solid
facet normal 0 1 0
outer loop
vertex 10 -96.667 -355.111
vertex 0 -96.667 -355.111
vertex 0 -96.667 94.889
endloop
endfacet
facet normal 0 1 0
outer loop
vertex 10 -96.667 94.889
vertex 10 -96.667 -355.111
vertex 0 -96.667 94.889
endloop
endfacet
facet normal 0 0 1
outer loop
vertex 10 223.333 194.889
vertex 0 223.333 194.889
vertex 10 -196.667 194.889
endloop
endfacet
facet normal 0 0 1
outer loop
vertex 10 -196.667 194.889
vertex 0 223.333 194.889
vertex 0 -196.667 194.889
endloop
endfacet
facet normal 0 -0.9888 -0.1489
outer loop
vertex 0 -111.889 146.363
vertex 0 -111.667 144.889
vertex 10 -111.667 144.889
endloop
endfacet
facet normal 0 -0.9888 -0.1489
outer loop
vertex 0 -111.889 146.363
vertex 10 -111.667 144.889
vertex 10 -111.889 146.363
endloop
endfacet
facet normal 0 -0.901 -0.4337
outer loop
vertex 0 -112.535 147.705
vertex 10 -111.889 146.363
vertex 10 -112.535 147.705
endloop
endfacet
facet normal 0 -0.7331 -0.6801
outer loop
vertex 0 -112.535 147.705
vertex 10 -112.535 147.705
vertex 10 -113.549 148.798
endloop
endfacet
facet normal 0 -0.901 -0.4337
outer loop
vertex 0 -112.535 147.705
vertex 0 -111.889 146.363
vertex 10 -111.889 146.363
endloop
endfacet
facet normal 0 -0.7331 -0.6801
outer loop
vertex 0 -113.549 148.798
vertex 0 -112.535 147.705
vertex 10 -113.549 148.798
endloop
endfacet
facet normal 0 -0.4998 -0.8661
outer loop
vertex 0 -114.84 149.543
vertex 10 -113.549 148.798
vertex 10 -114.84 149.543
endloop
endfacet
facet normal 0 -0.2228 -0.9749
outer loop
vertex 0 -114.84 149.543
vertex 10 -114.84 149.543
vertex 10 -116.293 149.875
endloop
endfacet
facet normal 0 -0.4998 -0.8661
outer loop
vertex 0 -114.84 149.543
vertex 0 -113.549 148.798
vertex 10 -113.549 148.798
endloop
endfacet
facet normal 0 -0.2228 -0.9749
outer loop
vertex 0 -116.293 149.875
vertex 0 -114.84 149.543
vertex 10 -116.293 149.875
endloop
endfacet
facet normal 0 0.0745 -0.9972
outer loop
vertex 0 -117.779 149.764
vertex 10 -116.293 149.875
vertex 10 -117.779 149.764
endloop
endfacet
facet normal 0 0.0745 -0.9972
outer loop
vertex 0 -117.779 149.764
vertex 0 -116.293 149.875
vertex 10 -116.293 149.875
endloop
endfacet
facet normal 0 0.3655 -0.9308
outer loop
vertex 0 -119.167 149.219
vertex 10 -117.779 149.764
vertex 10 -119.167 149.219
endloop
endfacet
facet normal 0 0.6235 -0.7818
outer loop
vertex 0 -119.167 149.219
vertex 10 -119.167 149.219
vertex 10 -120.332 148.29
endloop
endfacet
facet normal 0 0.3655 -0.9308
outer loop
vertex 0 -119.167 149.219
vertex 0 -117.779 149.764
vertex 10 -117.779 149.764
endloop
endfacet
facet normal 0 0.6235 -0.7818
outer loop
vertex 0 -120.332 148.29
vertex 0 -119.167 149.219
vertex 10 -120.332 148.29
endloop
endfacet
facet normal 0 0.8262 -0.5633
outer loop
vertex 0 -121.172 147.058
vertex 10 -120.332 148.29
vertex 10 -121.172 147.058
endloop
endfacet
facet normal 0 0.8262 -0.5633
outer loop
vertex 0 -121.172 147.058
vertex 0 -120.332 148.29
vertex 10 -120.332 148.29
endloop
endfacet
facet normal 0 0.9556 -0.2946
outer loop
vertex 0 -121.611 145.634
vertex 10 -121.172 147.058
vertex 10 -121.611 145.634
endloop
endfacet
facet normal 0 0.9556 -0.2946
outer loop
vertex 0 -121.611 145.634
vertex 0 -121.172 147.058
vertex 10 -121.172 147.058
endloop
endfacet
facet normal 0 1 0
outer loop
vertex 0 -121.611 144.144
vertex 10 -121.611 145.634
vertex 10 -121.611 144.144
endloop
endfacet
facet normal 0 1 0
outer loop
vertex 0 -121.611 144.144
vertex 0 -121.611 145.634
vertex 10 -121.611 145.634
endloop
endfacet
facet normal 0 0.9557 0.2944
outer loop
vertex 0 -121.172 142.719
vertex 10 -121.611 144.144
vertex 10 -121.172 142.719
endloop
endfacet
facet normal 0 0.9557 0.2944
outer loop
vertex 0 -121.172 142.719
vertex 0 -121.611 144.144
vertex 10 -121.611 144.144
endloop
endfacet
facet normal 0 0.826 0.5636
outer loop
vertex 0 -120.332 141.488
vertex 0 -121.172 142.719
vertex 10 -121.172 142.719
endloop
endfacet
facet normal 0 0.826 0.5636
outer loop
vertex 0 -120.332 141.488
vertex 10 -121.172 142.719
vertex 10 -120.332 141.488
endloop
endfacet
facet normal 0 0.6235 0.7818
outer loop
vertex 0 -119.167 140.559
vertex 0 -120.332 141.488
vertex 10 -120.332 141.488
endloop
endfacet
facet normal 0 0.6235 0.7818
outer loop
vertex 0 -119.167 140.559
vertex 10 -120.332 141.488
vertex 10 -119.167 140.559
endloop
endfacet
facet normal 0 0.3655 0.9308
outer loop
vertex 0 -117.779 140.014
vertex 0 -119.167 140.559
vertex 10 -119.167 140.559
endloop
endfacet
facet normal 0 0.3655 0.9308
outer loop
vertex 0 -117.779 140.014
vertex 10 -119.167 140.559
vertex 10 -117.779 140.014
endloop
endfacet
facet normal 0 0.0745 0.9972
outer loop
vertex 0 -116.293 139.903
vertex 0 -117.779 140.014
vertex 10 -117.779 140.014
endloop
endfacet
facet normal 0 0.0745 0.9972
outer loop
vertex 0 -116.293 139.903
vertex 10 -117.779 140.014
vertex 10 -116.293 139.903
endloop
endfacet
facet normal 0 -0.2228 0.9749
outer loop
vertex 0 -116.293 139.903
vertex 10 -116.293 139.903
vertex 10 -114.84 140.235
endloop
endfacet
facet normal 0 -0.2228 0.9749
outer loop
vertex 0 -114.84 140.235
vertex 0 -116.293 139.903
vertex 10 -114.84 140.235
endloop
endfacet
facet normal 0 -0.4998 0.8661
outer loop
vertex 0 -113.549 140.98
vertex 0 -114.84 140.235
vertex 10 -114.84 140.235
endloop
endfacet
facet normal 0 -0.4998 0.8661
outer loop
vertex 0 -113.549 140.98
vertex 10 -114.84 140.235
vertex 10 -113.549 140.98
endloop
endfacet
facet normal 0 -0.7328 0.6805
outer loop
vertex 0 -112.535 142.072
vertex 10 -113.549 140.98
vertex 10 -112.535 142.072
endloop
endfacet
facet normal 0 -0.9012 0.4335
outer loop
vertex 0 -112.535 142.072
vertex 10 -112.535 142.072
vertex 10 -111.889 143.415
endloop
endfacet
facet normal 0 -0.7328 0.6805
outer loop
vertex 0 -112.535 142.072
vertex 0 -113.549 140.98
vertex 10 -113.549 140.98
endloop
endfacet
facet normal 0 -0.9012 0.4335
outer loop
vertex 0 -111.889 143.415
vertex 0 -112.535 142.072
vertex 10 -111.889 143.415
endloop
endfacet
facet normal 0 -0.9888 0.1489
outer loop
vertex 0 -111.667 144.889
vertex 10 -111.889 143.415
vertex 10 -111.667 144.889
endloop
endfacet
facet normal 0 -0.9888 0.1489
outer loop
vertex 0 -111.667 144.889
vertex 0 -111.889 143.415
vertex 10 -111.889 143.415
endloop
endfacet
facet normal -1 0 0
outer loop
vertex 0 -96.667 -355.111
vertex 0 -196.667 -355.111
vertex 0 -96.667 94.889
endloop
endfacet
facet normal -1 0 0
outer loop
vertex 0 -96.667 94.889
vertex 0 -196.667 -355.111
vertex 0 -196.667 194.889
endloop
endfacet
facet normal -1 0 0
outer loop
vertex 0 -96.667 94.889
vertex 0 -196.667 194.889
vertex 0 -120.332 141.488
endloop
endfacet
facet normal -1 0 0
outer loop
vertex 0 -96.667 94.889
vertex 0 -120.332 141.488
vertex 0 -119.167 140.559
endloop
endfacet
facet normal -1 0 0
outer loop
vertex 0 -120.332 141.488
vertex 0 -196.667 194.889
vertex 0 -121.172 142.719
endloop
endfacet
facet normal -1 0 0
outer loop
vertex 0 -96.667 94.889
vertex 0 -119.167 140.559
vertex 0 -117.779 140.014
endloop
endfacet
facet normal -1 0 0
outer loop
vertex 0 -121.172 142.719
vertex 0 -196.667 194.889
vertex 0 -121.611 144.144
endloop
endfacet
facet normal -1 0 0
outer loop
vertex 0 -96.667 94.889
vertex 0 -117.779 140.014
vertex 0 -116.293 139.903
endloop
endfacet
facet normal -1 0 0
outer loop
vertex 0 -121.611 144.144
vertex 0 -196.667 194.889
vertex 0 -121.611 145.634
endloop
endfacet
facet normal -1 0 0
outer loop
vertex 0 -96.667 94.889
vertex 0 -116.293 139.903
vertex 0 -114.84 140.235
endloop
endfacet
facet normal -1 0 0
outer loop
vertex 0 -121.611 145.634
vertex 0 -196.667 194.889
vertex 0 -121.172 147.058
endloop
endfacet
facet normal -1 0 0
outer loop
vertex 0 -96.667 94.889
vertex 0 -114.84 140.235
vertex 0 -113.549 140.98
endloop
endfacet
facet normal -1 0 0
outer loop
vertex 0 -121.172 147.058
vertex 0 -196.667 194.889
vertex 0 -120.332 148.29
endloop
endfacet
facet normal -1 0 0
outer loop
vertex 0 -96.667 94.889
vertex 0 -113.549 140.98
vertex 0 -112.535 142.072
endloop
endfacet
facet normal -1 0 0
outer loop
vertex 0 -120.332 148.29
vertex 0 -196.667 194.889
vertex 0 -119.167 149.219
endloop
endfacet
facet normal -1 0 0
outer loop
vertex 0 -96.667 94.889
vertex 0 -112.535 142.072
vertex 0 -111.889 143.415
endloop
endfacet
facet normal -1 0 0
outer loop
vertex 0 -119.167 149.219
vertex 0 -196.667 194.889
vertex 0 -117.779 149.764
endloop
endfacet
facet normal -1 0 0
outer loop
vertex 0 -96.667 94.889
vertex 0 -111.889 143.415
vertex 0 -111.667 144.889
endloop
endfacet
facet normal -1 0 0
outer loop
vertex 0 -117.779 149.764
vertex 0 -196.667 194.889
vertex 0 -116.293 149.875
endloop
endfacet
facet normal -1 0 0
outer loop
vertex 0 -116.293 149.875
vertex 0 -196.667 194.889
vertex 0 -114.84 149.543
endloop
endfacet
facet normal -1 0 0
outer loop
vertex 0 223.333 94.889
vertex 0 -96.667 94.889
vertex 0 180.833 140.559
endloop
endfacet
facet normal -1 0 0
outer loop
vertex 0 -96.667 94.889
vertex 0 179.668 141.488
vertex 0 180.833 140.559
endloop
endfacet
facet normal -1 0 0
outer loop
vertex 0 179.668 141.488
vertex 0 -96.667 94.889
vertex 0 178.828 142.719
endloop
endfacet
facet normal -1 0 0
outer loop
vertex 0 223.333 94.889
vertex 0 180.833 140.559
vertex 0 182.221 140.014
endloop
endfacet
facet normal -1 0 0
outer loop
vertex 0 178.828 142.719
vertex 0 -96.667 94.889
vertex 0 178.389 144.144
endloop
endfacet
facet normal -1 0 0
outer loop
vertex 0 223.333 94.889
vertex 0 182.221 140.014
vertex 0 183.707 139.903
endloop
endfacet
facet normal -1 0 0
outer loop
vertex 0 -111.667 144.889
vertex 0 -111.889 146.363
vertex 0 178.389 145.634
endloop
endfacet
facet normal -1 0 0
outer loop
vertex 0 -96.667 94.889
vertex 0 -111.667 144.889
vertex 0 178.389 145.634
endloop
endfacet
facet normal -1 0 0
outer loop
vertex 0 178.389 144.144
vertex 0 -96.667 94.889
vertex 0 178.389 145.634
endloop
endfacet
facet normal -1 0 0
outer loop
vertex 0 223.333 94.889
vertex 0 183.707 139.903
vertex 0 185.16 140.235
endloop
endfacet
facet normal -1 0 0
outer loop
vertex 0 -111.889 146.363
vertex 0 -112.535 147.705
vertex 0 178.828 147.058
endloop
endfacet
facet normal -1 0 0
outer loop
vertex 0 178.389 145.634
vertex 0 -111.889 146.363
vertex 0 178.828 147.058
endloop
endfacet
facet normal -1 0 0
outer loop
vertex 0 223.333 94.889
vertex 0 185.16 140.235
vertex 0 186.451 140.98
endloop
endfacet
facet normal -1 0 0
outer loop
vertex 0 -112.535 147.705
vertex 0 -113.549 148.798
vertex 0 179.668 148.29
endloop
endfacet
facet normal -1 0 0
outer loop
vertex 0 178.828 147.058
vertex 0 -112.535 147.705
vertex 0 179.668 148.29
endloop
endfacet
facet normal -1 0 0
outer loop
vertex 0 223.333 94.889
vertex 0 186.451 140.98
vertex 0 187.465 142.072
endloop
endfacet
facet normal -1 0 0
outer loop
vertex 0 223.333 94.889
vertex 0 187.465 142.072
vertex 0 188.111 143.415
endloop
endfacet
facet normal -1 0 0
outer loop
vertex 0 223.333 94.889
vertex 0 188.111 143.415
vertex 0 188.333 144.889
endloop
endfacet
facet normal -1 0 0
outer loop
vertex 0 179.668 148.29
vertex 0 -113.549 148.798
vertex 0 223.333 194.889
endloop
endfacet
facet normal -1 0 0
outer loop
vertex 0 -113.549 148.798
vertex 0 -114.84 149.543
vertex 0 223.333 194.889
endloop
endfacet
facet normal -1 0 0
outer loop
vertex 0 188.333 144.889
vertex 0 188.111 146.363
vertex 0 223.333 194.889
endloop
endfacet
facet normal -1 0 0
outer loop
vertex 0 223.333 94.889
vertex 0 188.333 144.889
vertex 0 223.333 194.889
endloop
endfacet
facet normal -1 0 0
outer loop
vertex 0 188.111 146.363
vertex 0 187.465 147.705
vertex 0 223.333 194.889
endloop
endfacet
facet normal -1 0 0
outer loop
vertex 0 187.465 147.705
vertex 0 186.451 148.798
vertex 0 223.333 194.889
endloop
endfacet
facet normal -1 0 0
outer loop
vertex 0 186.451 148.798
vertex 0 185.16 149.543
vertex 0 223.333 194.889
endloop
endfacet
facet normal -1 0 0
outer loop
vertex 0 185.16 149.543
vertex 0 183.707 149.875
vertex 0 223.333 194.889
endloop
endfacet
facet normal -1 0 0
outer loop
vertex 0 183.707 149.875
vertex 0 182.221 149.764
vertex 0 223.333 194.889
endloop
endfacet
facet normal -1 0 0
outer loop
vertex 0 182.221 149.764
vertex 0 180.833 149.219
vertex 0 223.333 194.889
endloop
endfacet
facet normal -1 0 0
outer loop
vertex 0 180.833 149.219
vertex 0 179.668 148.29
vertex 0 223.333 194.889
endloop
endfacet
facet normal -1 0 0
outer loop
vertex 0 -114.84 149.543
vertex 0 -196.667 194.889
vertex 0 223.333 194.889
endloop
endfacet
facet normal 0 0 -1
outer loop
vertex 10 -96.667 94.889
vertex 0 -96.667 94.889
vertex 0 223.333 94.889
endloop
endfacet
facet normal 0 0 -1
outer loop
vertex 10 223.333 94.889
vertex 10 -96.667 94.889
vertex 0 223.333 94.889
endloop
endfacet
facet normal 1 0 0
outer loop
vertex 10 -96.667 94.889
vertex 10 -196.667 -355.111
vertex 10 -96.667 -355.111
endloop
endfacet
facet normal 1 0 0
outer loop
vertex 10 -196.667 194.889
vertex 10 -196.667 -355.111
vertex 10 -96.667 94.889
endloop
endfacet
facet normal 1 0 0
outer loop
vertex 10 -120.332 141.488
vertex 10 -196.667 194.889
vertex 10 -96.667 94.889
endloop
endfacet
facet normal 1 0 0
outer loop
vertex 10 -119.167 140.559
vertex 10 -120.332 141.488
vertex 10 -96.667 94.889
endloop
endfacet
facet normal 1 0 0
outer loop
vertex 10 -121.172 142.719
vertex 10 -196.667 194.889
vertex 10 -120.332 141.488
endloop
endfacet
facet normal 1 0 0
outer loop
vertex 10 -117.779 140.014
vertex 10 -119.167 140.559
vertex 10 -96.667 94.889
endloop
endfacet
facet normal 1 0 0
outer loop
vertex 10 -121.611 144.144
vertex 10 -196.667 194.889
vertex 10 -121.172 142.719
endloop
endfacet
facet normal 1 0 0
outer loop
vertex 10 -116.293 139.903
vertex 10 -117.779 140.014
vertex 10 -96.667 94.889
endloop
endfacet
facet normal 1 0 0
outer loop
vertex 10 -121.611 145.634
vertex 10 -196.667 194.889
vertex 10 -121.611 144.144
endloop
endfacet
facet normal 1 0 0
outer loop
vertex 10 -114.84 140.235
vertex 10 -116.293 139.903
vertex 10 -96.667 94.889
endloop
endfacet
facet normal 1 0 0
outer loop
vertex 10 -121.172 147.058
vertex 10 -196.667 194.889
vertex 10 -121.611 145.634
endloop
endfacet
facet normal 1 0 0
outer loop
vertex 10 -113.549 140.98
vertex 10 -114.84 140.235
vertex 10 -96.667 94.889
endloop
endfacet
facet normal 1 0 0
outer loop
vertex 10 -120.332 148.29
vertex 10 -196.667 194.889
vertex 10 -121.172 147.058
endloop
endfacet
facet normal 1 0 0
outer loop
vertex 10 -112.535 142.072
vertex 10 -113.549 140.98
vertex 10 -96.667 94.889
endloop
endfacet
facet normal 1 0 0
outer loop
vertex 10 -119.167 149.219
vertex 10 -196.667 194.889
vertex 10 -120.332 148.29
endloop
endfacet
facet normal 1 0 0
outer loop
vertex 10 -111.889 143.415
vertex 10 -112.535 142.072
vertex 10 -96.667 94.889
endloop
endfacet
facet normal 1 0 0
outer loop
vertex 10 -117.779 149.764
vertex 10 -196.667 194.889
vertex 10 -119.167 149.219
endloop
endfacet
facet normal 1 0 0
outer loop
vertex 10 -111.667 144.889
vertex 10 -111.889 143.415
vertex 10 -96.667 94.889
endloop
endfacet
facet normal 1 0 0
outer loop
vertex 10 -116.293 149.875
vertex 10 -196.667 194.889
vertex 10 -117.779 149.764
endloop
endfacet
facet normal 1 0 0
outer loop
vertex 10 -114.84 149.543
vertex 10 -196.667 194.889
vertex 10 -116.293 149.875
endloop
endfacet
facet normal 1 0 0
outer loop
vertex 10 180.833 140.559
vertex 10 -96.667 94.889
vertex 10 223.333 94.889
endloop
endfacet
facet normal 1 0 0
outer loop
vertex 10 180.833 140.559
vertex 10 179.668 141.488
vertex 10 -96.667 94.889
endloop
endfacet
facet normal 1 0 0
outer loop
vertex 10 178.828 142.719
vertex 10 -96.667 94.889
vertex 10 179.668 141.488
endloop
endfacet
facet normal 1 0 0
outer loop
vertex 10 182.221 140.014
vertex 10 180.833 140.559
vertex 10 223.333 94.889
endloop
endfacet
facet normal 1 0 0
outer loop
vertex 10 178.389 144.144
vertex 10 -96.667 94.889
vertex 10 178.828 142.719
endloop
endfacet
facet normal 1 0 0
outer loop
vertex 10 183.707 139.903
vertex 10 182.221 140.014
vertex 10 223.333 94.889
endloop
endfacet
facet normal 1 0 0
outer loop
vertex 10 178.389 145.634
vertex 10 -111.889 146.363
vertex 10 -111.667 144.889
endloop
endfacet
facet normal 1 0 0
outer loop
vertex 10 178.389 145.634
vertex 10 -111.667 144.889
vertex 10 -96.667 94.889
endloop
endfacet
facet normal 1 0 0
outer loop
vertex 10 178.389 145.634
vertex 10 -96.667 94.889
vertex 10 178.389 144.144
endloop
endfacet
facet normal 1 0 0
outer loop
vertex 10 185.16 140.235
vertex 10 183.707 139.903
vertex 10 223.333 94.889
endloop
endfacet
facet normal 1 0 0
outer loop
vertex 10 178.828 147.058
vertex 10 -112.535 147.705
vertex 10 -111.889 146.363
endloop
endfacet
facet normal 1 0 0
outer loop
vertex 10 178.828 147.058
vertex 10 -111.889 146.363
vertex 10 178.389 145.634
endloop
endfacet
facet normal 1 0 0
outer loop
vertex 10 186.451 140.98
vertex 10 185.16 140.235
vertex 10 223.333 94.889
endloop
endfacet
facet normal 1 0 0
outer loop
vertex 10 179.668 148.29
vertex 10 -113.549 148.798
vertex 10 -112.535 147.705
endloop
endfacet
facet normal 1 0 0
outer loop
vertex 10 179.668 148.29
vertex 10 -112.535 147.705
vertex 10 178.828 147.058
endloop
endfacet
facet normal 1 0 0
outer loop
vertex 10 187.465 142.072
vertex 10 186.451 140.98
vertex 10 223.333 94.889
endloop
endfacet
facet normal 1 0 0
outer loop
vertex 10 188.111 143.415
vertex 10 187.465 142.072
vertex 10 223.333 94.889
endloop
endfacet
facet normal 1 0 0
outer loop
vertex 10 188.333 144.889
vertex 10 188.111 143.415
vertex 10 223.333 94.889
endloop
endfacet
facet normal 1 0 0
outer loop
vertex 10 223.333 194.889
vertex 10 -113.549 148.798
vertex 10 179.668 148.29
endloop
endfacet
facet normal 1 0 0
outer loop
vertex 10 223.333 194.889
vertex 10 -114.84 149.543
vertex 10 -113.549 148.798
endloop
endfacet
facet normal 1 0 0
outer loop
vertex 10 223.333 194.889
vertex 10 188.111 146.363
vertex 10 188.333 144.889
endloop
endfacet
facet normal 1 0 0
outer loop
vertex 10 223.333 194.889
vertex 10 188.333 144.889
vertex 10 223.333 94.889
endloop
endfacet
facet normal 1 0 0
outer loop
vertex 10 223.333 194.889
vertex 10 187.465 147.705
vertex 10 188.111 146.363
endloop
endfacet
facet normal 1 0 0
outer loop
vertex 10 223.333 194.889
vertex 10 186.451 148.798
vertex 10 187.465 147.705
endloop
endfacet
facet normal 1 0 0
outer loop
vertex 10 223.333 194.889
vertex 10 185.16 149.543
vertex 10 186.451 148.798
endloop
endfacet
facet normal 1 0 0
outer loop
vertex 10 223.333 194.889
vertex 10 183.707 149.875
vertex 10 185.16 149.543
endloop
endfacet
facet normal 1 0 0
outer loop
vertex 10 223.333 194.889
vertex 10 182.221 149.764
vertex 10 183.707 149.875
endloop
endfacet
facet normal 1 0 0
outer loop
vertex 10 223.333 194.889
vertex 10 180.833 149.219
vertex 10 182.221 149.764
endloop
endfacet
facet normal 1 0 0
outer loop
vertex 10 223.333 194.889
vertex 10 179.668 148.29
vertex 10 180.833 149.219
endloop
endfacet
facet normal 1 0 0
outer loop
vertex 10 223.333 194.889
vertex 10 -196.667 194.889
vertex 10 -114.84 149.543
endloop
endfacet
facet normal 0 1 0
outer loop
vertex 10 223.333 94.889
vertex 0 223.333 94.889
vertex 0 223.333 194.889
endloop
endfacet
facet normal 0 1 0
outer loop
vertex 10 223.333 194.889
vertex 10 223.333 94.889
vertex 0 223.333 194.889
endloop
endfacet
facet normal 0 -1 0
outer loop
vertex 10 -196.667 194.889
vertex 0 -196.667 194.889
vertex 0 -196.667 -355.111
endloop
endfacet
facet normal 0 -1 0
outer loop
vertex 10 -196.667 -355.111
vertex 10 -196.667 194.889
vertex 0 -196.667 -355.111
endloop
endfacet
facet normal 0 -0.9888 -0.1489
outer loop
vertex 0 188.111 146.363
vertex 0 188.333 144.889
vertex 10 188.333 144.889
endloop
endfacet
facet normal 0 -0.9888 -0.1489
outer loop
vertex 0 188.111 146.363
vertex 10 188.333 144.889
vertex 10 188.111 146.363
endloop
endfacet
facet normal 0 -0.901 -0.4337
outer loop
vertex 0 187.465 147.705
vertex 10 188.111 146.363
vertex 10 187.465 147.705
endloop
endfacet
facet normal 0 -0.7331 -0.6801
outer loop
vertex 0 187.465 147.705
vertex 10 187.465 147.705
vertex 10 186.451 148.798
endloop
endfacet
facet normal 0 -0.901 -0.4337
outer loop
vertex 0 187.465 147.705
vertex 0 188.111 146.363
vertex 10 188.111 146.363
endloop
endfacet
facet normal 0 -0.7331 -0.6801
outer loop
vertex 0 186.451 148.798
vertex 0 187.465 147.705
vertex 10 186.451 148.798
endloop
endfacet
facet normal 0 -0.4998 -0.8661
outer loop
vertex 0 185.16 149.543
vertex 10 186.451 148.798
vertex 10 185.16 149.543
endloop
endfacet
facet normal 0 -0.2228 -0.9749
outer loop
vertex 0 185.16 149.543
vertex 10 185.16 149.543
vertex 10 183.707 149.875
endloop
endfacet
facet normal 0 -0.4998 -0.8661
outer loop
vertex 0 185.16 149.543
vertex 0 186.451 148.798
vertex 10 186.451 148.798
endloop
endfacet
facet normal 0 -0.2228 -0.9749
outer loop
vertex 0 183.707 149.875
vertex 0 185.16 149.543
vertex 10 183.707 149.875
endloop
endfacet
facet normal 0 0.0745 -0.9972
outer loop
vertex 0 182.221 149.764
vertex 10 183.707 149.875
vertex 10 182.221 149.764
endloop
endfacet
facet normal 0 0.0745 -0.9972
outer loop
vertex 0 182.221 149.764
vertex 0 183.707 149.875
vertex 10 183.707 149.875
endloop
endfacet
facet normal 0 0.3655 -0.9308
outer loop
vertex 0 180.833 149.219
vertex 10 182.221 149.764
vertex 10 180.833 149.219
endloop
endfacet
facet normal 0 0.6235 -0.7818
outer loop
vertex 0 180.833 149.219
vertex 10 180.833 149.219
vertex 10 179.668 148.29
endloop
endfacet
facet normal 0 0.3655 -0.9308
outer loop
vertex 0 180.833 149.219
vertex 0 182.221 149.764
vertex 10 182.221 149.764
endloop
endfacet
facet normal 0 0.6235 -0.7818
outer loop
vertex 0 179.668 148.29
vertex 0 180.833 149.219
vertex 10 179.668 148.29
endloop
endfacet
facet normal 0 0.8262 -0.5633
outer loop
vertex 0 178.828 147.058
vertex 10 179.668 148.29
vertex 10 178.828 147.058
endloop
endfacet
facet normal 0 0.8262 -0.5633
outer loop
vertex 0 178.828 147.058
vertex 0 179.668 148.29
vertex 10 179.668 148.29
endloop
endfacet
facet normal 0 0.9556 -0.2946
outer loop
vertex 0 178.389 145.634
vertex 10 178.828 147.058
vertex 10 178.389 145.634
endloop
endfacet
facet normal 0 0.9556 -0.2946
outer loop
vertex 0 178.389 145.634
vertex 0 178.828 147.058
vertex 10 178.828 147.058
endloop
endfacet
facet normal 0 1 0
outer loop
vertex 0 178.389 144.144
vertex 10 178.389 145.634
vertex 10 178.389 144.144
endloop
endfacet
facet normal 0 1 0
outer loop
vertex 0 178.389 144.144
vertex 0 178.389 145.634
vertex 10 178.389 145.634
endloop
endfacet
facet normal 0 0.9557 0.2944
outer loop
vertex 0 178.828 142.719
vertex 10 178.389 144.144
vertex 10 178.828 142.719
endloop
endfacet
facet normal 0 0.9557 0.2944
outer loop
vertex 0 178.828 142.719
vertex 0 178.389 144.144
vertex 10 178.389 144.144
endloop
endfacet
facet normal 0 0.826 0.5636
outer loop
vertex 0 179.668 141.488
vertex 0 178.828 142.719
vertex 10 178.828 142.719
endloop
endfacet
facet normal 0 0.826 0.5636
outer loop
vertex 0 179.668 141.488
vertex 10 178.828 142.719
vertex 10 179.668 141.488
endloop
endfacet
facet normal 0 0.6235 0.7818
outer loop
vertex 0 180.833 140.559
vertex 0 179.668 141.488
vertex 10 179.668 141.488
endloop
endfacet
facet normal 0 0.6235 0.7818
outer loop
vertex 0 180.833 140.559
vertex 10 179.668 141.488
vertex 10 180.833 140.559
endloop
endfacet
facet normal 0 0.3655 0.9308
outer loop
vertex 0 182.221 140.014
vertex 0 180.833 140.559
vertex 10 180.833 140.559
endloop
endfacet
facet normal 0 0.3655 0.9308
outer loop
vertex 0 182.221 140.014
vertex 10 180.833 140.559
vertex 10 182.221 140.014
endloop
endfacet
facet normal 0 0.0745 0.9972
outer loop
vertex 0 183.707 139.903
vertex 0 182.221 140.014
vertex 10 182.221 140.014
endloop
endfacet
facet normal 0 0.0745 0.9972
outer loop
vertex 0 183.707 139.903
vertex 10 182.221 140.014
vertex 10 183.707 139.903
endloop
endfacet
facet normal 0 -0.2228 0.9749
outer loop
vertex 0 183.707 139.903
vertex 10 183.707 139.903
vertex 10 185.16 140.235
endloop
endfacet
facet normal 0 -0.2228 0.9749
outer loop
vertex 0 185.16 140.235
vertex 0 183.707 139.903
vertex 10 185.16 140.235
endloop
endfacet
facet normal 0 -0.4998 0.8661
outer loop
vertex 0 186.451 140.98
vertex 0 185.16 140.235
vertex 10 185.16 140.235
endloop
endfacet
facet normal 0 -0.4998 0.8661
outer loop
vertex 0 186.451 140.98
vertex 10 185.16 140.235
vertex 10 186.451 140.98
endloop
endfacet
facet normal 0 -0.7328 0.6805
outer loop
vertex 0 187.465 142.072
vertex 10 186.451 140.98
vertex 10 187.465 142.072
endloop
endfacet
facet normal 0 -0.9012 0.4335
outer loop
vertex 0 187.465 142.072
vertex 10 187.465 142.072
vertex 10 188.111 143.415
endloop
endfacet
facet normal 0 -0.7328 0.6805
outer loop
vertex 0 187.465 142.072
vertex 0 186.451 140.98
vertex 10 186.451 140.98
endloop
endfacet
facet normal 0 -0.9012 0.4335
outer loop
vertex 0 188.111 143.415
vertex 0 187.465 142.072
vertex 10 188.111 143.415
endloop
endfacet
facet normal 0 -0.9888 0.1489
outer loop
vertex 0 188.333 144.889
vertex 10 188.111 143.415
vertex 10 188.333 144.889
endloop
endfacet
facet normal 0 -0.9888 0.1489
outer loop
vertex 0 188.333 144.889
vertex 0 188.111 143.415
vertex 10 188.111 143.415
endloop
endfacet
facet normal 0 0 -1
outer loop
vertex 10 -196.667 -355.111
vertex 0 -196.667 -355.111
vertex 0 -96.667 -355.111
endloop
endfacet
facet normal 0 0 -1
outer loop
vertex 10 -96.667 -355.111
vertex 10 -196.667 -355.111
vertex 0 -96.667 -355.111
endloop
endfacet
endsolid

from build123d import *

# Parameters (mm, degrees)
F0_R     = 5
F1_DEPTH = 10


with BuildPart() as f1:
    # F0 (on Right) → F1 (new body)
    with BuildSketch(Plane.YZ):
        Polygon((223.333333, 94.888889), (223.333333, 194.888889), (-196.666667, 194.888889), (-196.666667, -355.111111), (-96.666667, -355.111111), (-96.666667, 94.888889), align=None)
        with Locations((-116.666667, 144.888889)):
            Circle(F0_R, mode=Mode.SUBTRACT)
        with Locations((183.333333, 144.888889)):
            Circle(F0_R, mode=Mode.SUBTRACT)
    extrude(amount=F1_DEPTH)


solid = f1.part
